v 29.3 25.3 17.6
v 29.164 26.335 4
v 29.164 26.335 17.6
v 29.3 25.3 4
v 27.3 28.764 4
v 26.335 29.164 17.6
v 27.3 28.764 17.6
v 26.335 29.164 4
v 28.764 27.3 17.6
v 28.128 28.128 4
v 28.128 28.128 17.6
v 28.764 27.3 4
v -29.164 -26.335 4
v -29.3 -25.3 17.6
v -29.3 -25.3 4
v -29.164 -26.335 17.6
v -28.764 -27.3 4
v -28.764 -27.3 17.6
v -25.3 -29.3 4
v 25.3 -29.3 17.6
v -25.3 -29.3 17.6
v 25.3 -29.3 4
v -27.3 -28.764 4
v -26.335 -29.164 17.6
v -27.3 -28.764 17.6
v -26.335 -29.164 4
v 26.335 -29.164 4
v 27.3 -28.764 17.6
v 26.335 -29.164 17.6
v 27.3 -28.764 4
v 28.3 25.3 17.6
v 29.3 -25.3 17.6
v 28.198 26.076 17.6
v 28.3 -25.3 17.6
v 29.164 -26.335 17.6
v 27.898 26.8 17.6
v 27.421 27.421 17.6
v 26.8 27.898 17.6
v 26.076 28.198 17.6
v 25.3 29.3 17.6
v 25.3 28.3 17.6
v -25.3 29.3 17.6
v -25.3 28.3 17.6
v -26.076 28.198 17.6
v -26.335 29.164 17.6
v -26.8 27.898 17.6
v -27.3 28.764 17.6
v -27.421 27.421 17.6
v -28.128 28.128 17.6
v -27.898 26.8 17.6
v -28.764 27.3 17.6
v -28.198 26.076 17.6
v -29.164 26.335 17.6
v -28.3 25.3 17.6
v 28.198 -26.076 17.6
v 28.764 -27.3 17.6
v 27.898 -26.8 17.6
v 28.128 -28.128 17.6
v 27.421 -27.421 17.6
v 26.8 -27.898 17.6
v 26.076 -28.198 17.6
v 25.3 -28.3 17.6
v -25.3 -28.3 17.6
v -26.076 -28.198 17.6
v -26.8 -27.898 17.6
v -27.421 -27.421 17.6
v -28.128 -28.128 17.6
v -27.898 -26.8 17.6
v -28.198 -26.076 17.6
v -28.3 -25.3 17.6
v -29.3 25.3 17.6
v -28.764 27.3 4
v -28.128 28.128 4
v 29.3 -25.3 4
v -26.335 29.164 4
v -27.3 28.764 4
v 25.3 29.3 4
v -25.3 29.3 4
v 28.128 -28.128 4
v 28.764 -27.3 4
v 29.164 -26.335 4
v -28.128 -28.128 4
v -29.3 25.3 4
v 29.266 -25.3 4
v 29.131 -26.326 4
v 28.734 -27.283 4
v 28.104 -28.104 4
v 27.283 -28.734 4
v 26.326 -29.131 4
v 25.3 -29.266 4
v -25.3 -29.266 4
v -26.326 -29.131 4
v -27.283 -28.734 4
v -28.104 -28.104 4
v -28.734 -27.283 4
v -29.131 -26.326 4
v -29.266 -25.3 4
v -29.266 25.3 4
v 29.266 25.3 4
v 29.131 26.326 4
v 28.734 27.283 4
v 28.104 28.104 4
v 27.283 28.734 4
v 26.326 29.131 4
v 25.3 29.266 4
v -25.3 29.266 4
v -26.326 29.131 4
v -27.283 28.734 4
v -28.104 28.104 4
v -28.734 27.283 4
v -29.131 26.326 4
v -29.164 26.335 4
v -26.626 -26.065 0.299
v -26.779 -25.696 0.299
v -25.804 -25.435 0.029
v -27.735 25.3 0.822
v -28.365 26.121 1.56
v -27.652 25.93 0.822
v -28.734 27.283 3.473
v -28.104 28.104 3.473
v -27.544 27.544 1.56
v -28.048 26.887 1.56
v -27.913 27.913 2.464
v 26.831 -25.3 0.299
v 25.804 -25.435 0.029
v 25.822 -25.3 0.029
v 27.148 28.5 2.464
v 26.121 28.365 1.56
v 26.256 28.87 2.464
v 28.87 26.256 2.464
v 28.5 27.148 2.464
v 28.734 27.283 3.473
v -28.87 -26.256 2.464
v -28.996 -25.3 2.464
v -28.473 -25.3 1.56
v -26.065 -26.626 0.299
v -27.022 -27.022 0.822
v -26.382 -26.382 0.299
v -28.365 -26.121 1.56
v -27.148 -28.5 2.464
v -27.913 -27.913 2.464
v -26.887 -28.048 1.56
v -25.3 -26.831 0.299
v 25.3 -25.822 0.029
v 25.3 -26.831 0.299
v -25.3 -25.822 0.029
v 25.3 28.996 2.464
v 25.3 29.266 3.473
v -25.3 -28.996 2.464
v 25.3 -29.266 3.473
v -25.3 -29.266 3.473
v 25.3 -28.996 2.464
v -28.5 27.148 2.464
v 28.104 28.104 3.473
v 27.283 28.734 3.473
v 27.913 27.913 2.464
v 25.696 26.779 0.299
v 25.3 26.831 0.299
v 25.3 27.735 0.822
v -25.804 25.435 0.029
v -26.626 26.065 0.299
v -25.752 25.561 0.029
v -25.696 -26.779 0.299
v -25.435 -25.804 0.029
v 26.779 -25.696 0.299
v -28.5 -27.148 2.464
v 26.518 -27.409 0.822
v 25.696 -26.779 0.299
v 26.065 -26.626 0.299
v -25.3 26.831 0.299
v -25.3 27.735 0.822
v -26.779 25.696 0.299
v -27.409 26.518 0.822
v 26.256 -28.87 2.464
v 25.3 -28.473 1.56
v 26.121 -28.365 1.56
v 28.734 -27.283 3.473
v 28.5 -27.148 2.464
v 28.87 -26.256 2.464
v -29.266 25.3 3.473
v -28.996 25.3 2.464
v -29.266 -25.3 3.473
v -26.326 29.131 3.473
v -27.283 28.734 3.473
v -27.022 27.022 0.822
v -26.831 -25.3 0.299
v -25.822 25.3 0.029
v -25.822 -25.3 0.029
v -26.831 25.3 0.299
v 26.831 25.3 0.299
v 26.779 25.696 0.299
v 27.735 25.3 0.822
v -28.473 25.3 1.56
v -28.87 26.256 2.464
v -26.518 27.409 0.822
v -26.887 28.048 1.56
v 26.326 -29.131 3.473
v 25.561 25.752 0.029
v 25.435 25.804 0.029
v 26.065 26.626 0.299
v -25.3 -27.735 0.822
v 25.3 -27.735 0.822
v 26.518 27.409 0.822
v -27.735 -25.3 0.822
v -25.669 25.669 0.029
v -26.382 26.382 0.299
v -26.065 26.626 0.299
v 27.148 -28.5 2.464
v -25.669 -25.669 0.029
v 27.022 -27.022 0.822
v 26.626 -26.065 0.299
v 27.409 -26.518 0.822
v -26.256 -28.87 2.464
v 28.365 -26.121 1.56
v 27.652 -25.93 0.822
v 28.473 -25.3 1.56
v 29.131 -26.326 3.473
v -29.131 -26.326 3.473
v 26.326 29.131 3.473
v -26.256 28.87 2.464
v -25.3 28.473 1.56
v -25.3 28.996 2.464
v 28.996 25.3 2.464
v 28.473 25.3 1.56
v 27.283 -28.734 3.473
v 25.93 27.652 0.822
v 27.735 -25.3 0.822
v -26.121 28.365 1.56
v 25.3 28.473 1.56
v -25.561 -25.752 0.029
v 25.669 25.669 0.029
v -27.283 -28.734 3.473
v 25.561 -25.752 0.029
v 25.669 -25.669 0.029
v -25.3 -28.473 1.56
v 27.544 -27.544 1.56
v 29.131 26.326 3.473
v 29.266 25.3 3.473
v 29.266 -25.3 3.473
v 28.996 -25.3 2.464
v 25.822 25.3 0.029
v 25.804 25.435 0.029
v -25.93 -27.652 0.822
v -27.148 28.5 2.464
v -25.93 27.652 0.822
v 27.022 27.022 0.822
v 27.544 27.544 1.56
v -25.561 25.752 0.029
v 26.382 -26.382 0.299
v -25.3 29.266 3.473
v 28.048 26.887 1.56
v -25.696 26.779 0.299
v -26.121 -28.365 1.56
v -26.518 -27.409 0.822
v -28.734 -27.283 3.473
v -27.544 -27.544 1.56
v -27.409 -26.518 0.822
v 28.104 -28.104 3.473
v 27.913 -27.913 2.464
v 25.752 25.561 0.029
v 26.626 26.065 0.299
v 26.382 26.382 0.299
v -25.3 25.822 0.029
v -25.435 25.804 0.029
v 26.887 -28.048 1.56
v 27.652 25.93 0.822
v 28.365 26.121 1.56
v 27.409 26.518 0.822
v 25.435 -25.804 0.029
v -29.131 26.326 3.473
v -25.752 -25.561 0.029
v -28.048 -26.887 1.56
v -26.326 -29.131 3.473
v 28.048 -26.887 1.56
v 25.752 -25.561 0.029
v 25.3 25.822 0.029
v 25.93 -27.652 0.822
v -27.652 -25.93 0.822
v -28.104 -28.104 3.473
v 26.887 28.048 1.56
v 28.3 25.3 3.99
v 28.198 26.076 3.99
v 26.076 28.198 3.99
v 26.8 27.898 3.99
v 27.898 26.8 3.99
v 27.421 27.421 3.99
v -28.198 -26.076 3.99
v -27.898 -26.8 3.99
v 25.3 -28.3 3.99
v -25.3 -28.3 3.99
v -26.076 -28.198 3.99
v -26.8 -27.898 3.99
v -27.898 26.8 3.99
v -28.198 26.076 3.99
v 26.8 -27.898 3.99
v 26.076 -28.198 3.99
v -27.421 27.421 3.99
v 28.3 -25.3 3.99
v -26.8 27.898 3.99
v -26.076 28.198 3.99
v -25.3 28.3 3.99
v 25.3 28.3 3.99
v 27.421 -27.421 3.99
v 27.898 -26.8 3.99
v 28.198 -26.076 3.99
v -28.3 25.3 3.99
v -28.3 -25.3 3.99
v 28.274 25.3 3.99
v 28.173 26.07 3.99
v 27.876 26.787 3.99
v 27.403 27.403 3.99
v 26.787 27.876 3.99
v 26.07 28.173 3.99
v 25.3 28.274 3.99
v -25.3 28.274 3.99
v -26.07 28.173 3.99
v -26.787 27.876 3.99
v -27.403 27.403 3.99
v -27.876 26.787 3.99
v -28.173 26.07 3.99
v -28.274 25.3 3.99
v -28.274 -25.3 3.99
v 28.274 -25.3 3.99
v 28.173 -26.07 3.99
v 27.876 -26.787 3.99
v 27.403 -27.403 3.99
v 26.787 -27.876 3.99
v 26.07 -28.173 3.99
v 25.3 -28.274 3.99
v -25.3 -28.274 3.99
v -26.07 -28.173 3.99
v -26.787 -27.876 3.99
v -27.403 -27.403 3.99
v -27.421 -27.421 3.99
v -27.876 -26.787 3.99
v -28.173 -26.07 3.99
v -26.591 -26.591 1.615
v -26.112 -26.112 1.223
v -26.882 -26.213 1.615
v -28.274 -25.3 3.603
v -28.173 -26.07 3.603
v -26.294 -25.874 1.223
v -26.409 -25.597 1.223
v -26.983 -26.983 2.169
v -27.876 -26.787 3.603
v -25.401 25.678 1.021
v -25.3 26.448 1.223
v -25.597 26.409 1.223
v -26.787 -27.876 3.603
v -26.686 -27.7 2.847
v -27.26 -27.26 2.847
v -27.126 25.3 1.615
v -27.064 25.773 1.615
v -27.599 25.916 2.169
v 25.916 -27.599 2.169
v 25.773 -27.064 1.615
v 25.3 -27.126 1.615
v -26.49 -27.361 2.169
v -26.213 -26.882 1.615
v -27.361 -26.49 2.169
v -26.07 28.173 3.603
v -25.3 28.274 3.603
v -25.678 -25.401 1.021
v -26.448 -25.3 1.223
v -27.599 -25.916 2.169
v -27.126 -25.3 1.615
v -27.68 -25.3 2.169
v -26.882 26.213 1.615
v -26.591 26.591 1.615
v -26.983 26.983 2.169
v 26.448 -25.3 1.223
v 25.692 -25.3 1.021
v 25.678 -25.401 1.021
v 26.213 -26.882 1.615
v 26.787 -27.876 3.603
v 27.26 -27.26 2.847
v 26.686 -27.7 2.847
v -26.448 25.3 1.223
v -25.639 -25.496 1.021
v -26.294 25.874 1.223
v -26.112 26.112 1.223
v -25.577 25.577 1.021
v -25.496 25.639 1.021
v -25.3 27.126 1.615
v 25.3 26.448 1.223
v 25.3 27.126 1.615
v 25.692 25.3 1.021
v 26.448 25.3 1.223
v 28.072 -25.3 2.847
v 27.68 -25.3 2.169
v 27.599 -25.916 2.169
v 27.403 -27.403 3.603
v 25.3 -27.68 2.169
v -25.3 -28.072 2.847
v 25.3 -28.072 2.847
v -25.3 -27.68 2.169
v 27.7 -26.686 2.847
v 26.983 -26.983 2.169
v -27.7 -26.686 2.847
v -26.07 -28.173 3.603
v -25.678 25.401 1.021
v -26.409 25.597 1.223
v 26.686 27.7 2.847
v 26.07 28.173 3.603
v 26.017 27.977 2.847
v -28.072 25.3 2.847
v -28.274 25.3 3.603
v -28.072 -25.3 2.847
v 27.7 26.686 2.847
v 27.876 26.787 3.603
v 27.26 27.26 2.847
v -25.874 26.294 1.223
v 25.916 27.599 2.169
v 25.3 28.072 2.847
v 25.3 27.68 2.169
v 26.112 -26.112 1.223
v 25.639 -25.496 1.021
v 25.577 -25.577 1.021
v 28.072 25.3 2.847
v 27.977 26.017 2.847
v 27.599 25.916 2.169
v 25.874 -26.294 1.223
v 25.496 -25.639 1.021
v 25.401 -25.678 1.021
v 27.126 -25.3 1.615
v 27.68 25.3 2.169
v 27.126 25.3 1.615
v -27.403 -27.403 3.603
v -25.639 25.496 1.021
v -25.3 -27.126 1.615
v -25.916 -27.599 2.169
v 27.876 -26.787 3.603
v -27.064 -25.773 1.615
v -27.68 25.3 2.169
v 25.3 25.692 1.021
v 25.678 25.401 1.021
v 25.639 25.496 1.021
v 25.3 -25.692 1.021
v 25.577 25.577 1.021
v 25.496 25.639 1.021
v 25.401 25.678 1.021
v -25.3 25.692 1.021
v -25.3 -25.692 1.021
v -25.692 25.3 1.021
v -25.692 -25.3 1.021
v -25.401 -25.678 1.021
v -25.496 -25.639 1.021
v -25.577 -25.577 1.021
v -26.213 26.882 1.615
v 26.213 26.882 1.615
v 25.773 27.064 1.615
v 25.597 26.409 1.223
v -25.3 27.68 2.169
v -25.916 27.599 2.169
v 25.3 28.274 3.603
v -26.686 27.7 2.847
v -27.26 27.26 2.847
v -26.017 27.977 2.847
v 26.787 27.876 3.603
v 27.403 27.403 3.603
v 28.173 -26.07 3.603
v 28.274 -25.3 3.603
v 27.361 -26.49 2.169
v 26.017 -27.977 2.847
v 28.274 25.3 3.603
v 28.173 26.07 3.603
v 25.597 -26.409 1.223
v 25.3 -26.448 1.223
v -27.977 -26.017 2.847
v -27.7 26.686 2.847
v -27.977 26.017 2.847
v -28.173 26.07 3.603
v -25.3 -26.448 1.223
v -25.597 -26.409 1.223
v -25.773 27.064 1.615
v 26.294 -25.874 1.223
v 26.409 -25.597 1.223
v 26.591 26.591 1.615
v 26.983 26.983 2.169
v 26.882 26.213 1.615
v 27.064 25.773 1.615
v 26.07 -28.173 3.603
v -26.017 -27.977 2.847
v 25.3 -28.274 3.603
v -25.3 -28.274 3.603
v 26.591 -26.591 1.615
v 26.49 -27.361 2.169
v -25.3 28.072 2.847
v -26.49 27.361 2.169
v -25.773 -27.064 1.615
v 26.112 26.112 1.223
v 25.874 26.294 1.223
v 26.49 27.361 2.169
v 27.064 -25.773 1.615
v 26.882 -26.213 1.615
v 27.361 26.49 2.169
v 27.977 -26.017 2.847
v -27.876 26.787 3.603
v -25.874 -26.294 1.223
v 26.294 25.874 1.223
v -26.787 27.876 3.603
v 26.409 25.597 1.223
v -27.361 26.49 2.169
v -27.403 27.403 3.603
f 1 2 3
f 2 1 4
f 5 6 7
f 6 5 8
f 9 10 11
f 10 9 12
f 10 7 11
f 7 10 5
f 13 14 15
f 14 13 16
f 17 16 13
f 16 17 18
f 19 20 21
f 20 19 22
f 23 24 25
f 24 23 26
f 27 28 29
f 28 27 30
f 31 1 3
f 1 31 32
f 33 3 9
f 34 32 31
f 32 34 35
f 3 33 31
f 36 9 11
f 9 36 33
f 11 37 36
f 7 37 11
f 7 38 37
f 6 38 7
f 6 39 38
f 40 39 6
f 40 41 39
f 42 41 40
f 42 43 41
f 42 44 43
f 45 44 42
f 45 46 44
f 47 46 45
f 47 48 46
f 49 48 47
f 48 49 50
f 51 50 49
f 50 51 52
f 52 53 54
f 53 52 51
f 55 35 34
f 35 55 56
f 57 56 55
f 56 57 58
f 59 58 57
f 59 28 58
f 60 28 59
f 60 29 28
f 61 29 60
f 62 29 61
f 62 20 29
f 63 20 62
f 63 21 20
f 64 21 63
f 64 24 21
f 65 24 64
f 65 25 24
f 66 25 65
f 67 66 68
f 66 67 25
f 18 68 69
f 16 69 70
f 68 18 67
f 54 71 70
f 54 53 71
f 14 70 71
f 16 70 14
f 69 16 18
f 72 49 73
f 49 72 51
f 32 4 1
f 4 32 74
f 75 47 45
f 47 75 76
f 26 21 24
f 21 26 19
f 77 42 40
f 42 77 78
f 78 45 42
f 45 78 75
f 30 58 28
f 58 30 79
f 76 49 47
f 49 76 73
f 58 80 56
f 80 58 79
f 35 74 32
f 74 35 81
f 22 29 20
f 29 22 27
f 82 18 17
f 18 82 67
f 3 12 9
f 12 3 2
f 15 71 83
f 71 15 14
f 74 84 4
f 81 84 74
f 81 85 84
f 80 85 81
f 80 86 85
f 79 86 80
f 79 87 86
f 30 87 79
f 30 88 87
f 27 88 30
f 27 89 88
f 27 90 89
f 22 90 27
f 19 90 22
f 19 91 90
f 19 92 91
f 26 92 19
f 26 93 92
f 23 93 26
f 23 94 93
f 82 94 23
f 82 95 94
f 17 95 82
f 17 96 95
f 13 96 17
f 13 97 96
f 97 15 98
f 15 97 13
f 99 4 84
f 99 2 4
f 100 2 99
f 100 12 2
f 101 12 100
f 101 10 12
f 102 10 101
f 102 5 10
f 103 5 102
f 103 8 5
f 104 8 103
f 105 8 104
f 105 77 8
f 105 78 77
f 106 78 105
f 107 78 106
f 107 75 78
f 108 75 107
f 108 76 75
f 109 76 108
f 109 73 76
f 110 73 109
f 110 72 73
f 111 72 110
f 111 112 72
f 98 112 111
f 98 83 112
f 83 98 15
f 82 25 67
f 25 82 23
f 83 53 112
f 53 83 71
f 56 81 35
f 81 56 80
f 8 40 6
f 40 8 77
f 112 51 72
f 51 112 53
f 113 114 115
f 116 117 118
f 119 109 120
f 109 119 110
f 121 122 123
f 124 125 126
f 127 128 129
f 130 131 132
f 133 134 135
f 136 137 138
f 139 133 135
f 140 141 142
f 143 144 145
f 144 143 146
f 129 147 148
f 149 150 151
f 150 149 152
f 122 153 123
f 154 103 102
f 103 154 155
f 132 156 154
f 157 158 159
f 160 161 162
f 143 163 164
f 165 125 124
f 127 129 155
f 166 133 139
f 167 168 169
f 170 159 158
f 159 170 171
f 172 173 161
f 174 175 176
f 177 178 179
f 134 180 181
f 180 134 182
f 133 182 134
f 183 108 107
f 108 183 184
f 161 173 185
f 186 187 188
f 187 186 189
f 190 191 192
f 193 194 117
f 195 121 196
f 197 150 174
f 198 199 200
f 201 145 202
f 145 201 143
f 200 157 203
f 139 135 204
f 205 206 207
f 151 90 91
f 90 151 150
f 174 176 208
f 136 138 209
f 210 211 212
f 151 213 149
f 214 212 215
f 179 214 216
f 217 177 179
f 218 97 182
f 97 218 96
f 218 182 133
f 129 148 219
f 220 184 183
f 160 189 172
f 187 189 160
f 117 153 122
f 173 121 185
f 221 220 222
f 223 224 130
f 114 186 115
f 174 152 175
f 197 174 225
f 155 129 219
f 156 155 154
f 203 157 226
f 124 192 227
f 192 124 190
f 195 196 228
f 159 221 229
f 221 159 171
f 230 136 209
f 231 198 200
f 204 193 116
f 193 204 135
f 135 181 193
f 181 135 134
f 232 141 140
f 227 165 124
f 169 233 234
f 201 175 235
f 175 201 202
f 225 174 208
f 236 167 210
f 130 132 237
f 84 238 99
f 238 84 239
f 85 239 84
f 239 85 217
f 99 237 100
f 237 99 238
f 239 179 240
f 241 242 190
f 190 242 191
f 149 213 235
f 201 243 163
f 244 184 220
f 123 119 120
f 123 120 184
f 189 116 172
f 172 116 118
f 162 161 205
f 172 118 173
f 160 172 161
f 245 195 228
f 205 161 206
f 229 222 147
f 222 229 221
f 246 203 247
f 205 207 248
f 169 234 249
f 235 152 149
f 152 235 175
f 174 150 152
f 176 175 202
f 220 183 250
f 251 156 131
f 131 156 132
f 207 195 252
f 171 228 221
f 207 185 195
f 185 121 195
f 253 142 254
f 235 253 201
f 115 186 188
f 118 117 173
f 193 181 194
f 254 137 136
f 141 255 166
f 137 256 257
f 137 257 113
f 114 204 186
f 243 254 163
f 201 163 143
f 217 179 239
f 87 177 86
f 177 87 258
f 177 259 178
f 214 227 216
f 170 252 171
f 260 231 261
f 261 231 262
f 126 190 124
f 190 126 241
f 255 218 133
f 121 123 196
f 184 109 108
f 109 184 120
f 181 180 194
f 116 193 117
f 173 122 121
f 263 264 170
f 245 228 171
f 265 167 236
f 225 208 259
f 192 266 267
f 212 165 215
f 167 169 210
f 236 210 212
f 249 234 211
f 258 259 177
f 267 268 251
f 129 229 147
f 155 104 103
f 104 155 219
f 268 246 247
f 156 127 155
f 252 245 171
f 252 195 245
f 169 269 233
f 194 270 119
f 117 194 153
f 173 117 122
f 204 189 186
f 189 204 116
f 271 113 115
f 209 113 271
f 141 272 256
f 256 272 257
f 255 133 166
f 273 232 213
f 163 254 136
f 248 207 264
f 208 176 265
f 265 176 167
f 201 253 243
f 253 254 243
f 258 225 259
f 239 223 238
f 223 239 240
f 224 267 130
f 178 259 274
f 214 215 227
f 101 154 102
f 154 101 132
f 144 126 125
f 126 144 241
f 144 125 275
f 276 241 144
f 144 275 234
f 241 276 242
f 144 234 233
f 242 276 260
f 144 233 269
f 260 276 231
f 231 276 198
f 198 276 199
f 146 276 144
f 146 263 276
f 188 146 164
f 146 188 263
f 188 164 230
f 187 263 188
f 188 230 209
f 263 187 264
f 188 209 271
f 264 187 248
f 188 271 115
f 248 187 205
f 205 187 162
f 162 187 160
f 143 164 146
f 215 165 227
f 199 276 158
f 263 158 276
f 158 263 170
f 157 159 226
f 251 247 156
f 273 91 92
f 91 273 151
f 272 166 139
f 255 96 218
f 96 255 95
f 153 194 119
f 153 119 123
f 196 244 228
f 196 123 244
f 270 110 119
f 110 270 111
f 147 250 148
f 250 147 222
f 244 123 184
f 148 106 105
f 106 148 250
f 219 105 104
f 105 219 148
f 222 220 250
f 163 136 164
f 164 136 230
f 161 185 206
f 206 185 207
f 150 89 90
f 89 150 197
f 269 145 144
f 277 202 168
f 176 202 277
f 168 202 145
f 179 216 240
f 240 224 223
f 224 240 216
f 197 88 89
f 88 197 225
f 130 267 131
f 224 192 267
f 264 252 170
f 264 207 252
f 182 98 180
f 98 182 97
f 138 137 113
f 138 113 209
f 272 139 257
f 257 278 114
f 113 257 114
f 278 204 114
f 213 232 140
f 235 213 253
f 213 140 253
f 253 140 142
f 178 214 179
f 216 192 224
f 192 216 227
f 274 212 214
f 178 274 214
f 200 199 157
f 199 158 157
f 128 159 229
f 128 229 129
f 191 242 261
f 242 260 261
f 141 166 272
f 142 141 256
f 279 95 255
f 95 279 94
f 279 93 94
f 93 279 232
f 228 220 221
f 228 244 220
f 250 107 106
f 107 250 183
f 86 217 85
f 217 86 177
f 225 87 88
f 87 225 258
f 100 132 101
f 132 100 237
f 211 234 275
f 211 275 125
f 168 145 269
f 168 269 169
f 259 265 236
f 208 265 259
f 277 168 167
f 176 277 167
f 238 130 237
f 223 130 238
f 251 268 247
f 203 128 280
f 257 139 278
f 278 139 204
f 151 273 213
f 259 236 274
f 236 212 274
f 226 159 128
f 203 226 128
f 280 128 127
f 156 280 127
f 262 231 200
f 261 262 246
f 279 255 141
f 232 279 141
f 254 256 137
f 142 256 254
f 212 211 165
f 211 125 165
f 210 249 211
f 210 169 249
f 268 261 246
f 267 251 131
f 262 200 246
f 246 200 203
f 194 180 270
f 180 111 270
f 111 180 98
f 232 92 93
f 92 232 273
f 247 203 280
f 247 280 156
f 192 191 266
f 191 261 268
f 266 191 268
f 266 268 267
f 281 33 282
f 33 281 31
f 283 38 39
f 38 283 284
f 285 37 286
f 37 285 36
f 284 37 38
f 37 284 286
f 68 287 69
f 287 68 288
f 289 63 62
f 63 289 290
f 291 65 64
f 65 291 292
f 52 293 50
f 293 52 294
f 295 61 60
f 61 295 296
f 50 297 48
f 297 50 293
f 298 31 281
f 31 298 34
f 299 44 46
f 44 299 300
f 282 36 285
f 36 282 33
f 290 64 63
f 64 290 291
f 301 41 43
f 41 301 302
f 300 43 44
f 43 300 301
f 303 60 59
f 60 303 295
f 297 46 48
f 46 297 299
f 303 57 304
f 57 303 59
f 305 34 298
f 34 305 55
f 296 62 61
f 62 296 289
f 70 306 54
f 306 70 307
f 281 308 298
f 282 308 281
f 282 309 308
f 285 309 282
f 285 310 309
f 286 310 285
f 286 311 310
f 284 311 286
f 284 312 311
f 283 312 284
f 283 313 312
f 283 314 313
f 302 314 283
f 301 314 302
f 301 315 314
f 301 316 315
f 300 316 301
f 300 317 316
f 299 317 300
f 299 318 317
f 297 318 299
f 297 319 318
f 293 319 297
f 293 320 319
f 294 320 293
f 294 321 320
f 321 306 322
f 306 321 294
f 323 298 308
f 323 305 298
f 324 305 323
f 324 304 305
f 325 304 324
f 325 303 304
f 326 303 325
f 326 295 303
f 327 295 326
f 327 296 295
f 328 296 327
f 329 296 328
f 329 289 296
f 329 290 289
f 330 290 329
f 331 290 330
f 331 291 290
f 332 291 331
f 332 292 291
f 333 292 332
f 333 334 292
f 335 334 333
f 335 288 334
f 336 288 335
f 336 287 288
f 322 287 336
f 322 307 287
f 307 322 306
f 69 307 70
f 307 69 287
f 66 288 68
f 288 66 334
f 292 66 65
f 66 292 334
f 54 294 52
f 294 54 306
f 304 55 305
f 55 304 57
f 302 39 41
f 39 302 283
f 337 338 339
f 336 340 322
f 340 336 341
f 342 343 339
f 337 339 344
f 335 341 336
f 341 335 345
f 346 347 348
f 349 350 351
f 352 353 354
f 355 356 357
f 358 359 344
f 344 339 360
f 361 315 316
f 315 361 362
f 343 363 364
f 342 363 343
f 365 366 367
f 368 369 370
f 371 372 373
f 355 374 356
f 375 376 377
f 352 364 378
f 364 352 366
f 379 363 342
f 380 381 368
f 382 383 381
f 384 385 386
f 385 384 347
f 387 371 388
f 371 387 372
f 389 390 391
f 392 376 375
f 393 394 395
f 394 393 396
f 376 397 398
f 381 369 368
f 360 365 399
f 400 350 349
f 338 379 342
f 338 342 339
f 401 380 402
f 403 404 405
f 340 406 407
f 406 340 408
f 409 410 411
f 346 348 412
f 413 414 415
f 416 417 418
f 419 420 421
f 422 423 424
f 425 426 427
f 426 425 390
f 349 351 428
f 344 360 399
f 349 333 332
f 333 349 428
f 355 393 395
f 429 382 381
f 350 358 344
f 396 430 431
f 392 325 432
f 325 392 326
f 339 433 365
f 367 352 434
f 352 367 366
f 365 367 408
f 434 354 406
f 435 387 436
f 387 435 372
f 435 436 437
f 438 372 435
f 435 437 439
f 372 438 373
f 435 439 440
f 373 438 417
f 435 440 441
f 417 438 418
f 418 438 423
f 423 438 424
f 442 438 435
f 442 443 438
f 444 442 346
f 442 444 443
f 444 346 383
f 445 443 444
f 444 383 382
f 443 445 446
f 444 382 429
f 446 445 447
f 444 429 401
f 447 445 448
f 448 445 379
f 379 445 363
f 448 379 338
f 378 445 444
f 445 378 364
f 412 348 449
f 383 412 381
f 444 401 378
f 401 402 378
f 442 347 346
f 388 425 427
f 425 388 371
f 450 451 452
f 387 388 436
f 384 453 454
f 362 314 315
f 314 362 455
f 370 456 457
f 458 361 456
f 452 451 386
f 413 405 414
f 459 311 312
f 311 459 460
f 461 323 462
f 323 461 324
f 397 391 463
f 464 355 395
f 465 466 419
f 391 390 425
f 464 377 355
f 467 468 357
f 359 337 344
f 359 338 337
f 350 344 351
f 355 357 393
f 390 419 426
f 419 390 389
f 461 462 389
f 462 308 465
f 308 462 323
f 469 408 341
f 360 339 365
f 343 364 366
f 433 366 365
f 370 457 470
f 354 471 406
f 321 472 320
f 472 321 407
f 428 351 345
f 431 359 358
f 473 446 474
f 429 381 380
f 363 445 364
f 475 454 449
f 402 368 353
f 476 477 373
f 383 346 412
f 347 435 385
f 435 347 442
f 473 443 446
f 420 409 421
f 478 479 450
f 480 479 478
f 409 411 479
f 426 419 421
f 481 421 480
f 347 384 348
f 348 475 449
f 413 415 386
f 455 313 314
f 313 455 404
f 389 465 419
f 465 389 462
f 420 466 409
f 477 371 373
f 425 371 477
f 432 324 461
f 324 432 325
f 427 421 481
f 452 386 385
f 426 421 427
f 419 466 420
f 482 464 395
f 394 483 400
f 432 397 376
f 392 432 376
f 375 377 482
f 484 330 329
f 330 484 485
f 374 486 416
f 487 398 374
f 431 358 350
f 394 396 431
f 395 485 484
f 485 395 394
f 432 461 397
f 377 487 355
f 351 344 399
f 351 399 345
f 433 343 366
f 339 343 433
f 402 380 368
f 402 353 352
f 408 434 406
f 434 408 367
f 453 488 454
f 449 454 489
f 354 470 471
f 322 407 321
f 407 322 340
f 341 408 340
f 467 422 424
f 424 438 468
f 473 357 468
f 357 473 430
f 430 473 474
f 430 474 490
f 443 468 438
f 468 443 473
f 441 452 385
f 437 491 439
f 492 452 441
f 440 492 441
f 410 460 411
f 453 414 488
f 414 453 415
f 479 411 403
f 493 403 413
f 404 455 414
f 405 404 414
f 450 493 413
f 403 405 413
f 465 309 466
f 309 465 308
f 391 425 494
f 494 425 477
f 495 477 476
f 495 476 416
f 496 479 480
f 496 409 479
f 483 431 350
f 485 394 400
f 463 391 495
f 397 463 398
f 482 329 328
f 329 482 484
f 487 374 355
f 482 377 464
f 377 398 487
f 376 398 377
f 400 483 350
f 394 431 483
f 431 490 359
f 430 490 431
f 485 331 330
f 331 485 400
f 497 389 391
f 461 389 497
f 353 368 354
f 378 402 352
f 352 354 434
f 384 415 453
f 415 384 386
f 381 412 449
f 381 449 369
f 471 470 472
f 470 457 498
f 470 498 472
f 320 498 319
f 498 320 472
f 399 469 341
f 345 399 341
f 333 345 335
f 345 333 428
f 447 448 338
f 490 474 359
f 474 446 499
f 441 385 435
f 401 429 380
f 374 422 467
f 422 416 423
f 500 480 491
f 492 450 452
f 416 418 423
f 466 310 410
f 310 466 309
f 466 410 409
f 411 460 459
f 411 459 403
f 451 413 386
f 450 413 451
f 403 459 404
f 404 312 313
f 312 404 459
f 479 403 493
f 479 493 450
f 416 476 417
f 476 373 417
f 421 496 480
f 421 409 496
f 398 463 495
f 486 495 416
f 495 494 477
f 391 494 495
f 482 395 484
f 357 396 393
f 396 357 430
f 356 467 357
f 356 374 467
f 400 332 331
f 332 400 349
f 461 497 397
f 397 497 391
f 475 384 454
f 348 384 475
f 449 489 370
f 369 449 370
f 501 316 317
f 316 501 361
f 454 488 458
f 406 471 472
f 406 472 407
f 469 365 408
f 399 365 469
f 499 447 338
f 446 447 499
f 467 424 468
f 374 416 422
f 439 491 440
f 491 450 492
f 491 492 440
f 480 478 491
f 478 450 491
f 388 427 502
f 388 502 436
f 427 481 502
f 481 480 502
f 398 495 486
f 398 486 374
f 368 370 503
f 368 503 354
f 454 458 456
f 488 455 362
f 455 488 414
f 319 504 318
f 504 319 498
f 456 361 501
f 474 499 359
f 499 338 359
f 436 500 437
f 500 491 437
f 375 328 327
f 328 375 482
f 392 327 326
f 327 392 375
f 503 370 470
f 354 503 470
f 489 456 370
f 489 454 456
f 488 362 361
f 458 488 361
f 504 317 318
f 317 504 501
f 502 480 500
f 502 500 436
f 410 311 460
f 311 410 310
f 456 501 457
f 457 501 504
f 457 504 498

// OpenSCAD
// Customizable Ultimate Drawer System Inserts
// Remixed from MarcElbichon's Ultimate Drawer System https://www.thingiverse.com/thing:2302575 (CC-BY 4.0)
// Copyright (C) 2019 by Brian Alano (and possibly others)
// Licensed under the Creative Commons Attribution-NonCommercial-ShareAlike 4.0 (CC-BY-NC-SA 4.0)

/* Design notes
// width is x dimension, across the face of the drawer
// depth is y dimension, front to back of the drawer
// height is z dimension
*/

/* Coding Style Guide 
 * User parameters and modules use underscores between words.
 * Other variable names use camel case.
 * Separate features into their own modules if they are more than a couple lines long.
 * All dimensions should be assigned to variables, usually global ones so they can be found easily.
 * Keep local modules local.
 * Keep local variables local.
 * Maintain Thingiverse Customizer compatibility.
 * Maintain backwards compatibility with MarcElbichon's Ultimate Drawer System 
   (https://www.thingiverse.com/thing:2302575). This means a 1Ux1Ux1U drawer 
   made with this program will work in MarcElbichon's shelf. 
   
   See README.md for more.
*/

/* [Size] */
// Outside width in mm (1U drawer is 118 mm inside, 1.5U is 182.5 mm, 2U is 249 mm)
Width=59; // [8:0.5:249]
// Outside depth in mm (1U drawer is 118 mm inside, 1.5U is 182 mm, 2U is 248 mm)
Depth=59; // [8:248]
// Outside height in mm (1U drawer is 18 mm inside, 2U is 38 mm, 3U is 58 mm, etc.)
Height= 18; // [8:398]
// This amount is subtracted from each of the six sides to provide some wiggle room. Half your nozzle diameter is a good place to start if you're not sure.
Tolerance=0.2; // [0.00:0.02:1.00]

/* [Hidden] */
drawerWallThickness = 1; // assumed
drawerCornerRadius = 4; // assumed
insertWallThickness = 1;
insertCornerRadius = drawerCornerRadius; 
insertSize = [Width - Tolerance*2, Depth - Tolerance*2, Height - Tolerance*2];

// utility variables
epsilon = 0.01;
$fn=24;

module insert() {
    module add() {
        // main body
       translate([0, 0, insertCornerRadius])
            linear_extrude(insertSize.z - insertCornerRadius)
            roundtangle([insertSize.x, insertSize.y], radius=insertCornerRadius);
        // filleted bottom
       translate([0, 0, insertCornerRadius])
            roundtangle3d([insertSize.x, insertSize.y], insertCornerRadius);
    }
    
    module subtract() {
        insideRadius = insertCornerRadius - insertWallThickness;
        // main cut, minus fillets
        cut = [insertSize.x - insertWallThickness*2, 
            insertSize.y - insertWallThickness*2, 
            insertSize.z - insertWallThickness];
        translate([0, 0, insideRadius + insertWallThickness - epsilon]) 
            linear_extrude(cut.z - insideRadius + epsilon * 2) 
            roundtangle([cut.x, cut.y], insideRadius );
        // fillet cut
       translate([0, 0, insideRadius + insertWallThickness]) 
            roundtangle3d([cut.x, cut.y], insideRadius);
    }
     
    difference() {
        add();  
        subtract();
    }
}

module roundtangle(size, radius) {
    minkowski() {
        square([max(size.x - radius*2, epsilon), max(size.y - radius*2, epsilon)], center=true);
        circle(r=radius);
    }
}

module roundtangle3d(size, r) {
    minkowski() {
        cube([max(size.x - r*2, epsilon), max(size.y - r*2, epsilon), epsilon], center=true);
        sphere(r=r );
    }
}
    
insert();
